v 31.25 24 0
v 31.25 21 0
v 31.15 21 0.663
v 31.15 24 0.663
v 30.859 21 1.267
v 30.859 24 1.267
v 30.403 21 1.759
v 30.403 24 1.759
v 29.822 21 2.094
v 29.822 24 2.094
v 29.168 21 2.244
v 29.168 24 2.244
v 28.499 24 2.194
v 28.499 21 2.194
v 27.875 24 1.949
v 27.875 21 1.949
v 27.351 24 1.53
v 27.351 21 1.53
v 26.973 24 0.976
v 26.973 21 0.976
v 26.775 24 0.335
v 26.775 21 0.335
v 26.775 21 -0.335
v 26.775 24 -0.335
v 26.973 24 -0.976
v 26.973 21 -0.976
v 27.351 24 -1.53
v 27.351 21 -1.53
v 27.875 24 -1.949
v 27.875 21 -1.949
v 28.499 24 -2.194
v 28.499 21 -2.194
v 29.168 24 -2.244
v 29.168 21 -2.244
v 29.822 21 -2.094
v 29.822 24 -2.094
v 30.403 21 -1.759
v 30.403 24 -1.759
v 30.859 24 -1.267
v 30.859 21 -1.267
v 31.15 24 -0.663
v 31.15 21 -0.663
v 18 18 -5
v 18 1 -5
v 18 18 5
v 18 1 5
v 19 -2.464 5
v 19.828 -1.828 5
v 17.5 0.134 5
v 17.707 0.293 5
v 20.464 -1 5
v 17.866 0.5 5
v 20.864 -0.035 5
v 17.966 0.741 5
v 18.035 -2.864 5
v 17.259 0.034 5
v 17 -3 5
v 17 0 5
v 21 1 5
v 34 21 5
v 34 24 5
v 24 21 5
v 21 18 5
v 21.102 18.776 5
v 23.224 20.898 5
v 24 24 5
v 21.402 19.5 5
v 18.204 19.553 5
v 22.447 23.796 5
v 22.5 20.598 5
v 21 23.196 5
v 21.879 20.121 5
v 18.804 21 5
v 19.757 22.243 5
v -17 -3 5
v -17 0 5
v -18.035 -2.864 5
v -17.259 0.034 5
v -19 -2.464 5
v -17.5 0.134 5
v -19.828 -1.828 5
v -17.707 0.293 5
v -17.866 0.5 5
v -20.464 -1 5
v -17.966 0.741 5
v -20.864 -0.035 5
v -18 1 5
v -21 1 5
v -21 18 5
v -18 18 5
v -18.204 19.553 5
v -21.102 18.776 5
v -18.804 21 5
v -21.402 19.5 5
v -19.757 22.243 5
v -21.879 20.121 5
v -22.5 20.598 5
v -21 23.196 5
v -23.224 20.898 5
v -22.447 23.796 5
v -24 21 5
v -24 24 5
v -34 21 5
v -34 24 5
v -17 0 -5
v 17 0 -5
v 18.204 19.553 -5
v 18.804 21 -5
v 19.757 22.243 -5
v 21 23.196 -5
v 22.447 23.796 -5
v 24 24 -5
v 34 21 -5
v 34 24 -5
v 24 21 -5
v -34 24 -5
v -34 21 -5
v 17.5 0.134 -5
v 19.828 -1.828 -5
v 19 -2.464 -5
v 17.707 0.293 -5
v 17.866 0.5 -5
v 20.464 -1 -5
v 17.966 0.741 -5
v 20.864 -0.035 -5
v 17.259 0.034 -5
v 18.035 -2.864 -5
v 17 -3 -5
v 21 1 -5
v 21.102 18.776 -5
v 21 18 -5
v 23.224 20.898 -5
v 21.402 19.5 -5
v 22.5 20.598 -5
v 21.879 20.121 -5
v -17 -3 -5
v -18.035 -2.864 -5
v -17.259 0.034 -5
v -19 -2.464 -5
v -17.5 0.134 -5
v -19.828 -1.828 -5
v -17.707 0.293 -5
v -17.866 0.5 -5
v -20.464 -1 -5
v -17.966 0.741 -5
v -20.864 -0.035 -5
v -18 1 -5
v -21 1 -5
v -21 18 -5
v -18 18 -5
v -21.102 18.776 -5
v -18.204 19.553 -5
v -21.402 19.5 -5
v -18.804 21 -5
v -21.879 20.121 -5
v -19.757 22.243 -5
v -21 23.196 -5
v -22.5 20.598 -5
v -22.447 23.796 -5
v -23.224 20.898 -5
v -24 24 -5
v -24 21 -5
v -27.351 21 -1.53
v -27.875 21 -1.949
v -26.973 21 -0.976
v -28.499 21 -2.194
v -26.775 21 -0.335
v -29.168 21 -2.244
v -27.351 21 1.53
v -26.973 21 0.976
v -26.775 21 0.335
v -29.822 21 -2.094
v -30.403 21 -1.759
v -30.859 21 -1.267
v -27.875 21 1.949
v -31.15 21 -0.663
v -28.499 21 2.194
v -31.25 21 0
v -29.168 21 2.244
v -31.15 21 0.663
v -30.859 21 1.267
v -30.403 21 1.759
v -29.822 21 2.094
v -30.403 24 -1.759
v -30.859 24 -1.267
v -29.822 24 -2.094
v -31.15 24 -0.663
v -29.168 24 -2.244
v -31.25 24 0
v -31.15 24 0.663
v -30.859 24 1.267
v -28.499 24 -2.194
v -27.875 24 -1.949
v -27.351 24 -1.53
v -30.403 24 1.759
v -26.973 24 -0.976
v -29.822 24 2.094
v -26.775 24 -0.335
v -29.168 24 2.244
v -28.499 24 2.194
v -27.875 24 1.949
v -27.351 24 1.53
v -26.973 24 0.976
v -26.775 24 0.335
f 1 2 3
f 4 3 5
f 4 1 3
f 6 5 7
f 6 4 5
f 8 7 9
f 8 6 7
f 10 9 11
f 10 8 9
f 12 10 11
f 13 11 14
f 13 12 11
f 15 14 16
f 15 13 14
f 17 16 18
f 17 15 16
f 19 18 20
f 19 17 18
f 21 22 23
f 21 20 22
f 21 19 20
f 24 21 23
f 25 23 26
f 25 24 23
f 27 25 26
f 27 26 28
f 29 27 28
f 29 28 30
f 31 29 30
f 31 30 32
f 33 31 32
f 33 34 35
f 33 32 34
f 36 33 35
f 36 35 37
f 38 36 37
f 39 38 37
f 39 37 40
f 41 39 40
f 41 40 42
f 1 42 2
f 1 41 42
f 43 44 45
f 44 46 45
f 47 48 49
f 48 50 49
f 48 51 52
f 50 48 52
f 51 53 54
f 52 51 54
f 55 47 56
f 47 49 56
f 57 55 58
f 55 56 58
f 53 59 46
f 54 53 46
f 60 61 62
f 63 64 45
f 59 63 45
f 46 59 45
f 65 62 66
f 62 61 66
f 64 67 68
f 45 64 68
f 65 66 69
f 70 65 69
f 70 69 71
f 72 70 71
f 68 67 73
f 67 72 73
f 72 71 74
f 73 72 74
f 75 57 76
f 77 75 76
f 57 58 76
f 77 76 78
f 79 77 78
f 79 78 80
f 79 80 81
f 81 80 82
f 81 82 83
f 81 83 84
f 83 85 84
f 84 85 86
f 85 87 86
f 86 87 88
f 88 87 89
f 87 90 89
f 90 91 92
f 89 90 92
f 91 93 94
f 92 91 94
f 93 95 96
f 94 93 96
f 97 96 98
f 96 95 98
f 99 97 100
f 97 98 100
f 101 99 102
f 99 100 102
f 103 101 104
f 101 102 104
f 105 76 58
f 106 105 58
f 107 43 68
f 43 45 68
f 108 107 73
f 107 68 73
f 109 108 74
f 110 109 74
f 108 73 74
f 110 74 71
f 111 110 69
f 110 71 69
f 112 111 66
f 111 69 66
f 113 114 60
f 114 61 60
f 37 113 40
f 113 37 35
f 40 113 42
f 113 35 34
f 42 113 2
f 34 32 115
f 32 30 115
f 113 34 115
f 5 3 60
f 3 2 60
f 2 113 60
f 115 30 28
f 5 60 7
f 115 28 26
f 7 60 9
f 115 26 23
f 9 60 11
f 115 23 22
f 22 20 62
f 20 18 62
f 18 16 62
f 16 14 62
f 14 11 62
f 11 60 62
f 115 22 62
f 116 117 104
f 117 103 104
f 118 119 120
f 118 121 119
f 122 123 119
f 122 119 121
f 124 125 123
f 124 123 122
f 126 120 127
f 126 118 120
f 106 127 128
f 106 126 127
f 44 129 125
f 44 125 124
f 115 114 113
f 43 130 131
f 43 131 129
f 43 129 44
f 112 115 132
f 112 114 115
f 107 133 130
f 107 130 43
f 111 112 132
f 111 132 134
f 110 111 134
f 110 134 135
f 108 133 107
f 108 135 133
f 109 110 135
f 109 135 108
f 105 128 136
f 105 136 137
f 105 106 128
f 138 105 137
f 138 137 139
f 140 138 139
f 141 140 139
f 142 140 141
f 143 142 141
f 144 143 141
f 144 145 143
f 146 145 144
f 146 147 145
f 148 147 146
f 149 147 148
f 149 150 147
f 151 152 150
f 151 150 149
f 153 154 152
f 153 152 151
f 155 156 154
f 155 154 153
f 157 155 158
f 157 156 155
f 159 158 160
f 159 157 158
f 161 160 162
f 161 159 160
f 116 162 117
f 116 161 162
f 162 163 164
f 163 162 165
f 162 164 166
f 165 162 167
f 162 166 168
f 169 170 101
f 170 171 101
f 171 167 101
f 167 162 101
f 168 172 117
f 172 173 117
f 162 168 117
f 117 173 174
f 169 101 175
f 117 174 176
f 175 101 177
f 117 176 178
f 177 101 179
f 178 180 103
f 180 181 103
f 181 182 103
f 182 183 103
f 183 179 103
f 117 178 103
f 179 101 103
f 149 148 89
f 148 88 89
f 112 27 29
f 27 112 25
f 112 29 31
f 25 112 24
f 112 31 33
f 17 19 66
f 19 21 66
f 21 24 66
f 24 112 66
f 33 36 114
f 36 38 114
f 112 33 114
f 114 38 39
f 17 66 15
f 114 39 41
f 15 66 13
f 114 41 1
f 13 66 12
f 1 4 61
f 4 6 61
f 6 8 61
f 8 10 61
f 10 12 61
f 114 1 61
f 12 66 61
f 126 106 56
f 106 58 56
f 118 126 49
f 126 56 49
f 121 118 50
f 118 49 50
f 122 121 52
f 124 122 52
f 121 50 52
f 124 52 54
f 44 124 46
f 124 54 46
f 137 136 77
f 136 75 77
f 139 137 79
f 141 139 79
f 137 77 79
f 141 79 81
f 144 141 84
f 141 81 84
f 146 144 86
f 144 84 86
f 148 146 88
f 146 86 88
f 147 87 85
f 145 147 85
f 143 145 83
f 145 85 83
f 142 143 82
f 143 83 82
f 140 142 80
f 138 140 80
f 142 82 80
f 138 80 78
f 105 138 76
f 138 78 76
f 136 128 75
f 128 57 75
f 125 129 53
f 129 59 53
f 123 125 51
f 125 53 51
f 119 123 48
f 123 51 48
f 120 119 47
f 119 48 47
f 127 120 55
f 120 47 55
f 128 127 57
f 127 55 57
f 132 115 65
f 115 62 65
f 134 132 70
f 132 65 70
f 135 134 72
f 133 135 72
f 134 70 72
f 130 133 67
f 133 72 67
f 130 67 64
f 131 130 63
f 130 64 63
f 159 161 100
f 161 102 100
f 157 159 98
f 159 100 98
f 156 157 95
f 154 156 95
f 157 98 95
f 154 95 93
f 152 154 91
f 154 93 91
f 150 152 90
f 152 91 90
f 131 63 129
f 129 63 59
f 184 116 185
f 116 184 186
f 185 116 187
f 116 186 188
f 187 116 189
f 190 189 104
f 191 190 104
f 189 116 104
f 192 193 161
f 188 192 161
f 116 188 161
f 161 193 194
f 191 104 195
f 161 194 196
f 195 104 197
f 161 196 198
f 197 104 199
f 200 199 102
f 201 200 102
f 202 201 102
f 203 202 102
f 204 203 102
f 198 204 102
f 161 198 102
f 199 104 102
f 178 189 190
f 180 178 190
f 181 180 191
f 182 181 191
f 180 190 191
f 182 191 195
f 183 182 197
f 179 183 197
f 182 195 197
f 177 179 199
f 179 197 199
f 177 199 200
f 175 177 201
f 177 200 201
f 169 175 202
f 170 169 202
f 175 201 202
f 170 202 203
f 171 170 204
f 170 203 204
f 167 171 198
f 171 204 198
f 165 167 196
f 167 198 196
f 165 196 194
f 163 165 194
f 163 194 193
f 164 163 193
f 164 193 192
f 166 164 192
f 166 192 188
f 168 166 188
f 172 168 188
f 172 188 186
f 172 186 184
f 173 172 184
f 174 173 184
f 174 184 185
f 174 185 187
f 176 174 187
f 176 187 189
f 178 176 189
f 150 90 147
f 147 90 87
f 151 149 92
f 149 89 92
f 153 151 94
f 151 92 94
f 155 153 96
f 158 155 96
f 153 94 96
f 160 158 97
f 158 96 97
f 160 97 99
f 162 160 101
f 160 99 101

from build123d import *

# Parameters (mm, degrees)
BOSS_EXTRUDE1_DEPTH = 5
SKETCH2_R           = 2.25
CUT_EXTRUDE1_DEPTH  = 44.703546767


with BuildPart() as part:
    # Sketch1 → Boss-Extrude1 (new, symmetric)
    with BuildSketch(Plane.XY):
        with BuildLine():
            Line((-17, 0), (17, 0))
            ThreePointArc((17, 0), (17.707106781, 0.292893219), (18, 1))
            Line((18, 1), (18, 18))
            ThreePointArc((18, 18), (19.757359313, 22.242640687), (24, 24))
            Line((24, 24), (34, 24))
            Line((34, 24), (34, 21))
            Line((34, 21), (24, 21))
            ThreePointArc((24, 21), (21.878679656, 20.121320344), (21, 18))
            Line((21, 18), (21, 1))
            ThreePointArc((21, 1), (19.828427125, -1.828427125), (17, -3))
            Line((17, -3), (-17, -3))
            ThreePointArc((-17, -3), (-19.828427125, -1.828427125), (-21, 1))
            Line((-21, 1), (-21, 18))
            ThreePointArc((-21, 18), (-21.878679656, 20.121320344), (-24, 21))
            Line((-24, 21), (-34, 21))
            Line((-34, 21), (-34, 24))
            Line((-34, 24), (-24, 24))
            ThreePointArc((-24, 24), (-19.757359313, 22.242640687), (-18, 18))
            Line((-18, 18), (-18, 1))
            ThreePointArc((-18, 1), (-17.707106781, 0.292893219), (-17, 0))
        make_face()
    extrude(amount=BOSS_EXTRUDE1_DEPTH, both=True)

    # Sketch2 → Cut-Extrude1 (cut, through all)
    with BuildSketch(Plane(origin=(0, 24, 0), x_dir=(1, 0, 0), z_dir=(0, 1, 0))):
        with Locations(Location((-29, 0, 0), (0, 0, 180))):
            Circle(SKETCH2_R)
    cut_extrude1 = extrude(amount=-CUT_EXTRUDE1_DEPTH, mode=Mode.SUBTRACT)

    # Mirror1: Cut-Extrude1 across plane
    add(cut_extrude1.mirror(Plane(origin=(0, 0, 0), x_dir=(0, 0, 1), z_dir=(1, 0, 0))), mode=Mode.SUBTRACT)


solid = part.part
